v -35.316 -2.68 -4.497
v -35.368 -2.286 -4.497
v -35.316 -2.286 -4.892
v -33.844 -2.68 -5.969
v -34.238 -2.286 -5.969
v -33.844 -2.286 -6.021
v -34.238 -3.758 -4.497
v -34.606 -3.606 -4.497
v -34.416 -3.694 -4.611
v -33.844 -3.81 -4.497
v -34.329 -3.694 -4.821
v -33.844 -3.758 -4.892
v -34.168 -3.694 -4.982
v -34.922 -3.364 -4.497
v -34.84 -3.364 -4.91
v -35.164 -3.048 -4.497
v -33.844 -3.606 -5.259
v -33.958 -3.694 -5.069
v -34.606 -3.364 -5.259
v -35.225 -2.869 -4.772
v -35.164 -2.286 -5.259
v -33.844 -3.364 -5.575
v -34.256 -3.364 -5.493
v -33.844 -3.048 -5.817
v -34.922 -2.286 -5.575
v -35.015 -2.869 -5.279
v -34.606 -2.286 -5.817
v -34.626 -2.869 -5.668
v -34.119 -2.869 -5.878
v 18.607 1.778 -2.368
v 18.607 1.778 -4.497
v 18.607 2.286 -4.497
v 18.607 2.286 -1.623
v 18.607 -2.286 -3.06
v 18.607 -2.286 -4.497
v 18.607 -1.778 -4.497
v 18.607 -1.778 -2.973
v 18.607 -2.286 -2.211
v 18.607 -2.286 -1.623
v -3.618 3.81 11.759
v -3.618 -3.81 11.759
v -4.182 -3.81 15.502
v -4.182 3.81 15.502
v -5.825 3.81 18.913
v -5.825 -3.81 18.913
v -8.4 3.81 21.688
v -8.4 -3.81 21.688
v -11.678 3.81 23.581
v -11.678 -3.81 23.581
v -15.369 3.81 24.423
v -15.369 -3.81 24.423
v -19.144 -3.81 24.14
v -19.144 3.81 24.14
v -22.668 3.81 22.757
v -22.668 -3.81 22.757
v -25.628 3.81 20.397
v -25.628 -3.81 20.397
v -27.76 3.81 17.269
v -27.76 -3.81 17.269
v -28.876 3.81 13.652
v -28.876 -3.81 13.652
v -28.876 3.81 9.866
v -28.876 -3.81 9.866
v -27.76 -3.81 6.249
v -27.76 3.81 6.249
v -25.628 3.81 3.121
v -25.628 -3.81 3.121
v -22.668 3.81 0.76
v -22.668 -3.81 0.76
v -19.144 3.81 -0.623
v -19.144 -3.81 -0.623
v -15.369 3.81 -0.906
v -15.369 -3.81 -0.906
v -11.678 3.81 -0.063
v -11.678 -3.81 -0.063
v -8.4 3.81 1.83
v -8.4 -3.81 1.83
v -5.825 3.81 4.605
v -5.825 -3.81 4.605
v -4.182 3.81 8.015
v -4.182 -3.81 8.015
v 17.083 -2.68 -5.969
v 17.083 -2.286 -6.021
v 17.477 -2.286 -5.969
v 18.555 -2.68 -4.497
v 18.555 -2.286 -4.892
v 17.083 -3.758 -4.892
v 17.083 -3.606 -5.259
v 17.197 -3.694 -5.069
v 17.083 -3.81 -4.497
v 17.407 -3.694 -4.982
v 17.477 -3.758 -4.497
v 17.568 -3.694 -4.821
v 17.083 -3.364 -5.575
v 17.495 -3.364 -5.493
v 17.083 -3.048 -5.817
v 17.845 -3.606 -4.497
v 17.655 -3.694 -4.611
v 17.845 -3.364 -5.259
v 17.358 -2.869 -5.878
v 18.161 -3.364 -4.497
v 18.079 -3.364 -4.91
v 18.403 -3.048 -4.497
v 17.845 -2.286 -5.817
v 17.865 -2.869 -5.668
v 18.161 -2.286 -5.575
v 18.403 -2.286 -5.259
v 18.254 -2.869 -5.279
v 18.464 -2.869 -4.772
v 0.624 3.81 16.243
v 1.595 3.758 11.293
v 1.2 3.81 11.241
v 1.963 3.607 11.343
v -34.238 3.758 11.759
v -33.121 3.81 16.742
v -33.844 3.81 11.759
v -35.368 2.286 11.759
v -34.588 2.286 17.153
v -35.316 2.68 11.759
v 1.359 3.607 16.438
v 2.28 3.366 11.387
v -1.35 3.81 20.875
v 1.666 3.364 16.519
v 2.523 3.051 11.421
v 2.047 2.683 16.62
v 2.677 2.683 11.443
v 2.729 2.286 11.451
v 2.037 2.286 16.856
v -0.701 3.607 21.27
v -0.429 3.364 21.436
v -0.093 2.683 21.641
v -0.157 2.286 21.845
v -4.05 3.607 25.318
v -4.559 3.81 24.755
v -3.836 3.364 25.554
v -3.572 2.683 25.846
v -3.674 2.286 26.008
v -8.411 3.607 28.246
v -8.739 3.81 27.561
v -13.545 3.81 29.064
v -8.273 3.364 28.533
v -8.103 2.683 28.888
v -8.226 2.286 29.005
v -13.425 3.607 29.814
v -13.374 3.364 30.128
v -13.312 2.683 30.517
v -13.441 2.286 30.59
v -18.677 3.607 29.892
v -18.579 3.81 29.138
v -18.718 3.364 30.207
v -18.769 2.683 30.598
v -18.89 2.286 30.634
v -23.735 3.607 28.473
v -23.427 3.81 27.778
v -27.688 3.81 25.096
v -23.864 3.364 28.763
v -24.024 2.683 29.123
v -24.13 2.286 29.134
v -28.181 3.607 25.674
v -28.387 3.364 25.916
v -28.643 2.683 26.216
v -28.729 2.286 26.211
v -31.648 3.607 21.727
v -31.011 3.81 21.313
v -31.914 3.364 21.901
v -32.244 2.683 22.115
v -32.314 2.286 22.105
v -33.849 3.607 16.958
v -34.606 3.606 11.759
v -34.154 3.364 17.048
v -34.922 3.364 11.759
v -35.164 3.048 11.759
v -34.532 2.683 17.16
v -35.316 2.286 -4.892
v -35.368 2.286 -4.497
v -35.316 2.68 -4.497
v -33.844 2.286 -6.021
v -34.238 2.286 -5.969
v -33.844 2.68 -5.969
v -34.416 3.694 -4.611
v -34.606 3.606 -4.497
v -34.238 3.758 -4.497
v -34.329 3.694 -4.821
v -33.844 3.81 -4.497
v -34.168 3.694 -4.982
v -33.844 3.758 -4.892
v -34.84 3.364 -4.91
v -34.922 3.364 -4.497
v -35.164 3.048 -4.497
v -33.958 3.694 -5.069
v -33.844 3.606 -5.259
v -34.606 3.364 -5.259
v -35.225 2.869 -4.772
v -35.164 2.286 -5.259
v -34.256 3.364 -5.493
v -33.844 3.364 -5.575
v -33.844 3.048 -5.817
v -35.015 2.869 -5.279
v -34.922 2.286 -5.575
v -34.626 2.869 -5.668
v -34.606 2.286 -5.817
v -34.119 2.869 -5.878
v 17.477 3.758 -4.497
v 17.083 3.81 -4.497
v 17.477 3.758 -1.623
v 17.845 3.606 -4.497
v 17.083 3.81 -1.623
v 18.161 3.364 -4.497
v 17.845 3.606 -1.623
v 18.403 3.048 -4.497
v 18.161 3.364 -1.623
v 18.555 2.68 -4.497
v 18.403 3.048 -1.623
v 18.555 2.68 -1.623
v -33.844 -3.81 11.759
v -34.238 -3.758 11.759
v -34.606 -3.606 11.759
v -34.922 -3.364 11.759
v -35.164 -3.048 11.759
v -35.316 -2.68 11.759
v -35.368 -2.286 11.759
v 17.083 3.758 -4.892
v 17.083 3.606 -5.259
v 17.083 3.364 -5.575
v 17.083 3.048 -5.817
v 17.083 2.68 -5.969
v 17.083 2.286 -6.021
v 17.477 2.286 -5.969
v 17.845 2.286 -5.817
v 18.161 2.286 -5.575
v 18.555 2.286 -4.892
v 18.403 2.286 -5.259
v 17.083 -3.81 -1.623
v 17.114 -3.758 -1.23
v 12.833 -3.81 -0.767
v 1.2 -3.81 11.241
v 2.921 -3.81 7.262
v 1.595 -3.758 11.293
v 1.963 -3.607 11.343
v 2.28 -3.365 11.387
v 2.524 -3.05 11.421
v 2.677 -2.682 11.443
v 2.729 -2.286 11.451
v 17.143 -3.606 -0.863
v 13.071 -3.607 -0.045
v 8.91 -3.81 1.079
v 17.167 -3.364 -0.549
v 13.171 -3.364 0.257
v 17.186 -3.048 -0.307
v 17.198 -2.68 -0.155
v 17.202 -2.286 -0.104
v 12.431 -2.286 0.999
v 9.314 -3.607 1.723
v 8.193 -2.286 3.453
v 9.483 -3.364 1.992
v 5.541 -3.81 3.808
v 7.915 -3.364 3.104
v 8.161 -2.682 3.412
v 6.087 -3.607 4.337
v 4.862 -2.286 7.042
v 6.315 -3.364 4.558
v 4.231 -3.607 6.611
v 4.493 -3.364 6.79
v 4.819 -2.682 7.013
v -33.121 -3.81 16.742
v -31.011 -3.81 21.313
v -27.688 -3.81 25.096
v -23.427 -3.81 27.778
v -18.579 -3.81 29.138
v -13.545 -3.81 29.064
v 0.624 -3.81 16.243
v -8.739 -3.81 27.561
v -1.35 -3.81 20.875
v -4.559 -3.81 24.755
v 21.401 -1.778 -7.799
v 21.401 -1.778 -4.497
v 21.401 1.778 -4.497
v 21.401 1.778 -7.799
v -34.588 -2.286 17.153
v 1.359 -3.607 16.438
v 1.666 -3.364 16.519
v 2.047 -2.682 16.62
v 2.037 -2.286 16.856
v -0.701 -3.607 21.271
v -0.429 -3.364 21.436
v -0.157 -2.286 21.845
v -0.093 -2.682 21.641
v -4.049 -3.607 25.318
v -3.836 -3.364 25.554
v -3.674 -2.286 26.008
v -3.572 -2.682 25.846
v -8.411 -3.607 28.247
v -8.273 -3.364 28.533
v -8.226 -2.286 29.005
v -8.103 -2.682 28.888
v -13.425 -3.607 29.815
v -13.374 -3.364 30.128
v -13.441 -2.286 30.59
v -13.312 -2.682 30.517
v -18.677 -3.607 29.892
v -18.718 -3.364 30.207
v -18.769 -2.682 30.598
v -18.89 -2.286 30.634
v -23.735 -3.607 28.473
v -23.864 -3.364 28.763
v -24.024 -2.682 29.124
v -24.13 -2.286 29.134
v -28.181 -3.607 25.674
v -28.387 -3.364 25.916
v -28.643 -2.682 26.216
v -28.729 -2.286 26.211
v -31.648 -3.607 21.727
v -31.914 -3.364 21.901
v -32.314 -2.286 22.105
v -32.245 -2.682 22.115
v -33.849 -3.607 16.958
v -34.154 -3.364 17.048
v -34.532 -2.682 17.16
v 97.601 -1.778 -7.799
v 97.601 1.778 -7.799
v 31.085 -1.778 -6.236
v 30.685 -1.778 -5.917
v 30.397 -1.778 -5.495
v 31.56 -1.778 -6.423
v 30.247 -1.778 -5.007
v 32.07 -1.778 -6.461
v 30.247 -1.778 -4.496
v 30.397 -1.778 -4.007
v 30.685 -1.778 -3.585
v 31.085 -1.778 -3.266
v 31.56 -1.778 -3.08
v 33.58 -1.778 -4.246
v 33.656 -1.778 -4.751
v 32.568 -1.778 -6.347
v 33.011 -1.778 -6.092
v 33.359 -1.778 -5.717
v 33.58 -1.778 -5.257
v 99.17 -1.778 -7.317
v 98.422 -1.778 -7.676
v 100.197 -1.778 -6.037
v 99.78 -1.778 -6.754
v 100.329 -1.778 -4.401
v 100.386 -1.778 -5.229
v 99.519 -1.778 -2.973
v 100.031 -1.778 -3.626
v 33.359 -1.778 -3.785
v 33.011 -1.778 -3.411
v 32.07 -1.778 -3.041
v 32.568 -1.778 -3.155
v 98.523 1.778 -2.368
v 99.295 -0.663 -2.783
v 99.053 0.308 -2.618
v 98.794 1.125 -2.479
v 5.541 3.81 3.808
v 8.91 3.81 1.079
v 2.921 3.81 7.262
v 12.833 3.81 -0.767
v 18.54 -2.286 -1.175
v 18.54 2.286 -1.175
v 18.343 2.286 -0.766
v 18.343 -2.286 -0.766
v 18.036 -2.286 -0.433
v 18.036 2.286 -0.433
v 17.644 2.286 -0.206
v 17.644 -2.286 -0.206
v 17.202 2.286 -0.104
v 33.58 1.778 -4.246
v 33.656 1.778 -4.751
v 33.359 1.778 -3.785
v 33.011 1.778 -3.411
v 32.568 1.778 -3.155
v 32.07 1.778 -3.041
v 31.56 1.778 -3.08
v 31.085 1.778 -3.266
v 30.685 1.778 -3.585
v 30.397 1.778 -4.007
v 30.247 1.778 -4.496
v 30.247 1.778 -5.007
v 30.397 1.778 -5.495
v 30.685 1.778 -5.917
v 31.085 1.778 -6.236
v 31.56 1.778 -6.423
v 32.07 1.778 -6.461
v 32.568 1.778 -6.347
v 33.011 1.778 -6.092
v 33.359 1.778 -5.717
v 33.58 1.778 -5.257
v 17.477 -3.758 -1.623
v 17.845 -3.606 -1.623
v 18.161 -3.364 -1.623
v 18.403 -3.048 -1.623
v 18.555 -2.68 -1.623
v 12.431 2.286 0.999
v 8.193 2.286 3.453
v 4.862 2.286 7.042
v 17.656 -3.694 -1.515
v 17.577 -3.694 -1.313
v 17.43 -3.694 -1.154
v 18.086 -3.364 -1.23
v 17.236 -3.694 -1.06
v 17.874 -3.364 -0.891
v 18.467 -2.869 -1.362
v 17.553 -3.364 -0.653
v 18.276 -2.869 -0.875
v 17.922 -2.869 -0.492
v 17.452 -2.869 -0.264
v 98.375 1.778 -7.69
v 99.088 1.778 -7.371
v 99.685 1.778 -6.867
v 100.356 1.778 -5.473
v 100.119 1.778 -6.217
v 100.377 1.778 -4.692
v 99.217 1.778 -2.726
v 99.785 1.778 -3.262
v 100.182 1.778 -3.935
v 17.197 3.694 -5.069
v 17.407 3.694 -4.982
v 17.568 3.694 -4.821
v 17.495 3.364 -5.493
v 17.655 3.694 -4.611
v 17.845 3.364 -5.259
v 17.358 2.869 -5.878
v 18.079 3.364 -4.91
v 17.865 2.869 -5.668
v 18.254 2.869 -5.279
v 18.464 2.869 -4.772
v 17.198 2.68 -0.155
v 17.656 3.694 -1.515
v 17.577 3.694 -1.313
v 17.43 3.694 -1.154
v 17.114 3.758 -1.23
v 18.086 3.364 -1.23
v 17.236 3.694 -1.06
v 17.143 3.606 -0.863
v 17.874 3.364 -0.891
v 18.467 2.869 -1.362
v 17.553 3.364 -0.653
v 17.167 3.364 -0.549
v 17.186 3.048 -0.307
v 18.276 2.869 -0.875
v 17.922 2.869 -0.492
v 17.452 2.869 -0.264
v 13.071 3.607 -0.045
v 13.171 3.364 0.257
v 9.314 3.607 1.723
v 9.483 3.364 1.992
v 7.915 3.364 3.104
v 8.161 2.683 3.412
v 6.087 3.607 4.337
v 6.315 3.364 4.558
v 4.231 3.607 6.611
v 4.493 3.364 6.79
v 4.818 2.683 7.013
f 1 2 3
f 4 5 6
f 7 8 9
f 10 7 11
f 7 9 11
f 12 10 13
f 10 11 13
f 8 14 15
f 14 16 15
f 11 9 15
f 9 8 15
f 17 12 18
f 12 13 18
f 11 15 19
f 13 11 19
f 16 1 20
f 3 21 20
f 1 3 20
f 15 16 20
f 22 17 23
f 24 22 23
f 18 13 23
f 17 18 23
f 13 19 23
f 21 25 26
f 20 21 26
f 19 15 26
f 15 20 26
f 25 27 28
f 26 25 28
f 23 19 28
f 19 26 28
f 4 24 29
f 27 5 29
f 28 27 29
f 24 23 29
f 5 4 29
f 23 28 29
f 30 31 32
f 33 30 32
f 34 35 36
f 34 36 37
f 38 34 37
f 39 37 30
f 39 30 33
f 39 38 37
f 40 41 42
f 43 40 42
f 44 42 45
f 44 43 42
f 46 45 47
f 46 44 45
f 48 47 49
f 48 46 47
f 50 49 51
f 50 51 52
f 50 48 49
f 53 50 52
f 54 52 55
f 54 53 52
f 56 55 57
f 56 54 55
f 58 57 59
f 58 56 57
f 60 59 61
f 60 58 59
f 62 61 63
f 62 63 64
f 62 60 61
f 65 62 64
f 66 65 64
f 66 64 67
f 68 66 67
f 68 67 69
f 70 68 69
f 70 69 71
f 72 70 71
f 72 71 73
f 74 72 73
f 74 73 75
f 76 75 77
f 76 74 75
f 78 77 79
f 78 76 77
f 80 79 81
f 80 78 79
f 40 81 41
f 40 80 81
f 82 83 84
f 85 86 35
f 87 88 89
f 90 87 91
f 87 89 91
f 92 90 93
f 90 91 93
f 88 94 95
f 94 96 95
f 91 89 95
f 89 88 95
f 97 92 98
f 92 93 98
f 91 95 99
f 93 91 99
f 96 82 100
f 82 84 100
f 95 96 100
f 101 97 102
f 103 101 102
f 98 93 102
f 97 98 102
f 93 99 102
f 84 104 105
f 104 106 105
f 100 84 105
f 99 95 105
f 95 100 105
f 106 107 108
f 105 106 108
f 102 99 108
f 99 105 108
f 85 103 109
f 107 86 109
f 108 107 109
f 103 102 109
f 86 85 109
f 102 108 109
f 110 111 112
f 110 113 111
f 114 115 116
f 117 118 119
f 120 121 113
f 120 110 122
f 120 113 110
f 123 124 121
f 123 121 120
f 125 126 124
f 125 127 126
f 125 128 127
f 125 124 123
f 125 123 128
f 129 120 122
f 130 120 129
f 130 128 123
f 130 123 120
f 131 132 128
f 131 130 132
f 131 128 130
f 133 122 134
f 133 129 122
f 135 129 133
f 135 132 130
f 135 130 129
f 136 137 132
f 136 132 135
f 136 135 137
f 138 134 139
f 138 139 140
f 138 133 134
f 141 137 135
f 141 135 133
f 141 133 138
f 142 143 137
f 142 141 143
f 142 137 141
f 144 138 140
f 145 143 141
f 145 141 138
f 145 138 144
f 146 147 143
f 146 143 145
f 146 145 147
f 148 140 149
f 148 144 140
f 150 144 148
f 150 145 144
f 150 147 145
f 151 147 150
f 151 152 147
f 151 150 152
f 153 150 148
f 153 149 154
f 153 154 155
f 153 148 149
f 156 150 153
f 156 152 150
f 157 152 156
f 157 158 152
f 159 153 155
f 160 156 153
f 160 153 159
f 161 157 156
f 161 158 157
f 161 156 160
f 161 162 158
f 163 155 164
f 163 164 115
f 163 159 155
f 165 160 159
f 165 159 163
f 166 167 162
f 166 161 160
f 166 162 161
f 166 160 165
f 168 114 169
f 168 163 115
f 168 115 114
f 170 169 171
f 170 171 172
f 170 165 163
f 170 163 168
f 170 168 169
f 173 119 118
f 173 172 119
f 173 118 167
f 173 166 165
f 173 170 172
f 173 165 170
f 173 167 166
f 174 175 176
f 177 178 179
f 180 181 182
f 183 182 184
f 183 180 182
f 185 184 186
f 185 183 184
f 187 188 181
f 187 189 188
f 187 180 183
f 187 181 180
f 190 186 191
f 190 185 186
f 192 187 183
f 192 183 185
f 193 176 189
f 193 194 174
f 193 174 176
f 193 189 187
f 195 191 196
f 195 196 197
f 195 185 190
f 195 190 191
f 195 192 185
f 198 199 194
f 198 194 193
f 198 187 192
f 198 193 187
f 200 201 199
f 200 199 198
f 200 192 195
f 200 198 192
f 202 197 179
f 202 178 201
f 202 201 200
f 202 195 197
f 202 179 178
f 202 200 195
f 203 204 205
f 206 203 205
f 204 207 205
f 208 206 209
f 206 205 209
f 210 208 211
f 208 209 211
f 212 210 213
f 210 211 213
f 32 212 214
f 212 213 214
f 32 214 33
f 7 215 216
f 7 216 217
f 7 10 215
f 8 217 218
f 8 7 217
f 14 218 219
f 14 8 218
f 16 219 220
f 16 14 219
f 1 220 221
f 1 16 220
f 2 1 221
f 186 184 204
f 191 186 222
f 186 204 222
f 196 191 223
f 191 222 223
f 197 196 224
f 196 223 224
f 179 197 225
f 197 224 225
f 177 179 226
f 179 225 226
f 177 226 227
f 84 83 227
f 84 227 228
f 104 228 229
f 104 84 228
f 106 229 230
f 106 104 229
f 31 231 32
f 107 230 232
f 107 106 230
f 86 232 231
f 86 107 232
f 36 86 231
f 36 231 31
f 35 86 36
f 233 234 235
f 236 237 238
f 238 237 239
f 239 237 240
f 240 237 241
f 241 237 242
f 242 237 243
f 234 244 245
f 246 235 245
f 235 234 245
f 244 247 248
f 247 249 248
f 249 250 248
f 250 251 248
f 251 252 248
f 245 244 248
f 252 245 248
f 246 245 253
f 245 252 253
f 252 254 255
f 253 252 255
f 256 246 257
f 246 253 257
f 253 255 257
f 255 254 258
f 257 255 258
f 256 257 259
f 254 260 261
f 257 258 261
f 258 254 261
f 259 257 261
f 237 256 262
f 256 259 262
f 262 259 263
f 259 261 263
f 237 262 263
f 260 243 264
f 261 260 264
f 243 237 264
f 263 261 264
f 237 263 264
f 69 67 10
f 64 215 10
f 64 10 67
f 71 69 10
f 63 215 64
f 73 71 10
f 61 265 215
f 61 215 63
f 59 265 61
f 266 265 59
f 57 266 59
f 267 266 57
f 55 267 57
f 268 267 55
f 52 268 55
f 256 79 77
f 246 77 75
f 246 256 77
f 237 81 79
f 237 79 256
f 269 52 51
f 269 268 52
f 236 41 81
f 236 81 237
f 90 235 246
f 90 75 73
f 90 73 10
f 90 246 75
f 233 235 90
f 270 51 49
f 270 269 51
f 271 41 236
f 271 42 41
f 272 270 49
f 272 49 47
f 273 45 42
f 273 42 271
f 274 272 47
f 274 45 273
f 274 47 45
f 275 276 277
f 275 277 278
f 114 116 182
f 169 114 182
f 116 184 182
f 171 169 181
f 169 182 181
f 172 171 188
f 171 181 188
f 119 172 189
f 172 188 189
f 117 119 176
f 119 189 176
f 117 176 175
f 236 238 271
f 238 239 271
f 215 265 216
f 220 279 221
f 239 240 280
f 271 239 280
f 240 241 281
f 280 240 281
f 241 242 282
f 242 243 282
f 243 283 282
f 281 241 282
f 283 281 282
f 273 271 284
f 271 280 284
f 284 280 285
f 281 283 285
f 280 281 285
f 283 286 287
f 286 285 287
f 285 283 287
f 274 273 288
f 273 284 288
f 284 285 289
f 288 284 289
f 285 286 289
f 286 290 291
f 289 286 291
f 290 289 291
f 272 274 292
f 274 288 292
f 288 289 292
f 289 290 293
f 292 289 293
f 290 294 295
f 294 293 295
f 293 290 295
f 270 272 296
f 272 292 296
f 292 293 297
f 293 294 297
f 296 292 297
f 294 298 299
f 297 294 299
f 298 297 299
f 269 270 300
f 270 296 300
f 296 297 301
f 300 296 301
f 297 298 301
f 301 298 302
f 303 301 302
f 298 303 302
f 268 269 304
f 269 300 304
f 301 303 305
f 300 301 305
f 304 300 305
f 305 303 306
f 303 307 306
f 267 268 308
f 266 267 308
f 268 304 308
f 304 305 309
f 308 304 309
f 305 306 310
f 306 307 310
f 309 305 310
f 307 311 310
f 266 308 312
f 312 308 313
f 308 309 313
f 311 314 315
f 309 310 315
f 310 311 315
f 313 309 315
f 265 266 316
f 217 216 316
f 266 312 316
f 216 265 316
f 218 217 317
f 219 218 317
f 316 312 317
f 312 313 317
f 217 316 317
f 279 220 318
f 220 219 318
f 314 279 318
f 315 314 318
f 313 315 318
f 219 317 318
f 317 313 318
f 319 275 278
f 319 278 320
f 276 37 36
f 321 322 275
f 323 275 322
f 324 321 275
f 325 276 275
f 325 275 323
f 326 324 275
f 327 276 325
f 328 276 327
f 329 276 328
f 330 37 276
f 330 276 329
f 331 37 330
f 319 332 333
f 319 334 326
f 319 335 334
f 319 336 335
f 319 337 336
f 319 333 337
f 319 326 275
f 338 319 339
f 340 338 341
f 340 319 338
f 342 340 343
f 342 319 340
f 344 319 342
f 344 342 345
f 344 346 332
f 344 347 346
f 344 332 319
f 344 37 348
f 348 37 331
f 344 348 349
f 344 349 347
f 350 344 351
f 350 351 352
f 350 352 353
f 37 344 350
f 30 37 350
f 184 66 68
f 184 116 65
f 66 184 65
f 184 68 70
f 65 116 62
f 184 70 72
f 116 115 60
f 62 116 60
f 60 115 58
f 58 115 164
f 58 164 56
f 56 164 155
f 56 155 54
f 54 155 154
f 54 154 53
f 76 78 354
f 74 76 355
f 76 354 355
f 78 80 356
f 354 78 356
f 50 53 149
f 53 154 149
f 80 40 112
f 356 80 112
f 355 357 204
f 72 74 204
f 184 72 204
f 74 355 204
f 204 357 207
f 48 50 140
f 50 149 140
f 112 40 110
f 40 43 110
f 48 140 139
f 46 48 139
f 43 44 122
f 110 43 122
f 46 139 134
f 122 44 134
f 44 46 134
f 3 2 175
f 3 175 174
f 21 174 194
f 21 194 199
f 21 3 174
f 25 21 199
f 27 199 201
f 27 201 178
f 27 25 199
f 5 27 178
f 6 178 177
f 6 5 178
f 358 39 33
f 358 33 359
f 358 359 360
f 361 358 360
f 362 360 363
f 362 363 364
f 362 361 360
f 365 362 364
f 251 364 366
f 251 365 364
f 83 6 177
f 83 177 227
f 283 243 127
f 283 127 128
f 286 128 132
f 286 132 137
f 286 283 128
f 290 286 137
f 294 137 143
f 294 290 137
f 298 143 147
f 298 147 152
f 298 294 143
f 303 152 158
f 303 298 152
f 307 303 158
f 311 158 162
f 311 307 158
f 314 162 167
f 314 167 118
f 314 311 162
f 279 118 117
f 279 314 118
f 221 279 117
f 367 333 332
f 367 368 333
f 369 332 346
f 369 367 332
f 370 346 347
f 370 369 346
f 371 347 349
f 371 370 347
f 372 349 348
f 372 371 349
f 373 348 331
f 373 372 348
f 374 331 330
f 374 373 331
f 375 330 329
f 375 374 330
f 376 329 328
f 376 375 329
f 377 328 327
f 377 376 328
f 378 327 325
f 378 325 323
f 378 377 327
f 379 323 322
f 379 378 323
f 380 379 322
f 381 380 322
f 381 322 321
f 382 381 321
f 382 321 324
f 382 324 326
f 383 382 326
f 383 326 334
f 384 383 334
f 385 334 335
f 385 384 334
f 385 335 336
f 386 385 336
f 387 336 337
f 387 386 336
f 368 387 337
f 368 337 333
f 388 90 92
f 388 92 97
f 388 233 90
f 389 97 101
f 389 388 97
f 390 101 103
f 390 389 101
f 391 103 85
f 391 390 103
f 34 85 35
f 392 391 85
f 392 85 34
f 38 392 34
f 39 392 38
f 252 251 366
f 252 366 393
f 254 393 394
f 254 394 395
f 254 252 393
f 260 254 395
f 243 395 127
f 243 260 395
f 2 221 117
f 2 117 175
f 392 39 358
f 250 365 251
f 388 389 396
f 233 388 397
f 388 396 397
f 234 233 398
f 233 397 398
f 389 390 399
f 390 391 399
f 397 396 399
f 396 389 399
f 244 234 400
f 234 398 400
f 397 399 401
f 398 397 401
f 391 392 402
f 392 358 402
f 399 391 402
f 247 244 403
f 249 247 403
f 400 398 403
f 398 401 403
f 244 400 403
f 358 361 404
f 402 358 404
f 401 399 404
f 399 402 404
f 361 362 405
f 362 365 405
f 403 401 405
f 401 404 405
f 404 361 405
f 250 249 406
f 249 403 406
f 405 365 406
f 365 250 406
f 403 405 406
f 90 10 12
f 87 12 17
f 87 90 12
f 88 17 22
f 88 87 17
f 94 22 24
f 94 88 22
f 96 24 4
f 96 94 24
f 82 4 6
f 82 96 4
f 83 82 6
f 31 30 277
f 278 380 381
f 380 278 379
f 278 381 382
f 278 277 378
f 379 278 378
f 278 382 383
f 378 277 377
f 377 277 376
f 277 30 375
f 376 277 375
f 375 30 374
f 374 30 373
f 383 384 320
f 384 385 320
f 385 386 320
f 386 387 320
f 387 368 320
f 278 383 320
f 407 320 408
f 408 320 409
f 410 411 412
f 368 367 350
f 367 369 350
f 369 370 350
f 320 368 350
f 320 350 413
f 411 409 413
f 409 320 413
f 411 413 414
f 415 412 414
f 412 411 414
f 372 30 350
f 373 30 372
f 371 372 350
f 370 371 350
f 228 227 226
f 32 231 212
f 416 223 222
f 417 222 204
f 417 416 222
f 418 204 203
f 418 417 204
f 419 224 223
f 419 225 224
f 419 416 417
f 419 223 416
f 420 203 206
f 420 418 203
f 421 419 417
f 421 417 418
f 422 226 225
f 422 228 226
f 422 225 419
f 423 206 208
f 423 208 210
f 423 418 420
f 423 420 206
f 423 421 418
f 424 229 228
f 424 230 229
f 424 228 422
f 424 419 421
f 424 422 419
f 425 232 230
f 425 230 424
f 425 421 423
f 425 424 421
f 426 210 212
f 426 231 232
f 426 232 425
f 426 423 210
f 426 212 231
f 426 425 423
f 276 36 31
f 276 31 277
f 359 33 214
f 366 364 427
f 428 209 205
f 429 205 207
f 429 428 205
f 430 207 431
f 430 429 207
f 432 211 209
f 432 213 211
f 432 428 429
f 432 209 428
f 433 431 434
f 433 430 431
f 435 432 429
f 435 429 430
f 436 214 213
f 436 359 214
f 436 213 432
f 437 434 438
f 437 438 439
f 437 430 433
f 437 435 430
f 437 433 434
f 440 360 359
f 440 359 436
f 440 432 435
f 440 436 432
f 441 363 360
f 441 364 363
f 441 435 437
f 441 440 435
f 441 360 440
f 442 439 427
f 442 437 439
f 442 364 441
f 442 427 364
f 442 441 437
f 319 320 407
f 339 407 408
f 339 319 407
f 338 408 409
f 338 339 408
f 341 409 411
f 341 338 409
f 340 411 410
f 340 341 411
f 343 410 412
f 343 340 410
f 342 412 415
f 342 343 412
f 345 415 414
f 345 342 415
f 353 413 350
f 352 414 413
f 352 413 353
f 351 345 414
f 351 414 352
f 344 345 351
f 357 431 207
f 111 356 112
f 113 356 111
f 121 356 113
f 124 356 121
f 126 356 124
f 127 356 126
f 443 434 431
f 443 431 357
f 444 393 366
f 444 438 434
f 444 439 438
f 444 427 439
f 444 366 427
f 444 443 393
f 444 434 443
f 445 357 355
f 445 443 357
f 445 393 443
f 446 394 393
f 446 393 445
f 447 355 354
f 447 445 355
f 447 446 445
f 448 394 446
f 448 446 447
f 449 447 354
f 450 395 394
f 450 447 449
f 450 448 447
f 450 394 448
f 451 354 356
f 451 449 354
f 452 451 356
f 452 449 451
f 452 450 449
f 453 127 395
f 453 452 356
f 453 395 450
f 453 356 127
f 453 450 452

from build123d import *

# Parameters (mm, degrees)
F0_R     = 1.7145
F1_DEPTH = 1.778
F0_R_2   = 12.7
F2_DEPTH = 3.81
F3_R     = 1.524
F5_DEPTH = 81.789
F6_DEPTH = 81.789


with BuildPart() as f1:
    # F0 (on Front) → F1 (new body, symmetric)
    with BuildSketch(Plane.XZ):
        with BuildLine():
            Line((18.6069666262, -2.2111574336), (18.6069666262, -4.4971574336))
            Line((18.6069666262, -4.4971574336), (21.4009666262, -4.4971574336))
            Line((21.4009666262, -4.4971574336), (21.4009666262, -7.7991574336))
            Line((21.4009666262, -7.7991574336), (97.6009666262, -7.7991574336))
            ThreePointArc((97.6009666262, -7.7991574336), (100.3949666262, -5.0051574336), (97.6009666262, -2.2111574336))
            Line((97.6009666262, -2.2111574336), (18.6069666262, -2.2111574336))
        make_face()
        with Locations((31.9419666262, -4.7511574336)):
            Circle(F0_R, mode=Mode.SUBTRACT)
    extrude(amount=F1_DEPTH, both=True)

    # F0 (on Front) → F2 (join, symmetric)
    with BuildSketch(Plane.XZ):
        with BuildLine():
            ThreePointArc((-35.3680333738, -4.4971574336), (-34.9216641084, -5.5747881681), (-33.8440333738, -6.0211574336))
            Line((-33.8440333738, -6.0211574336), (17.0829666262, -6.0211574336))
            ThreePointArc((17.0829666262, -6.0211574336), (18.1605973607, -5.5747881681), (18.6069666262, -4.4971574336))
            Line((18.6069666262, -4.4971574336), (18.6069666262, -2.2111574336))
            Line((18.6069666262, -2.2111574336), (18.6069666262, -1.6228641659))
            ThreePointArc((18.6069666262, -1.6228641659), (18.2019597184, -0.5882480731), (17.2022022436, -0.1035357395))
            ThreePointArc((17.2022022436, -0.1035357395), (8.1933226976, 3.4532292373), (2.7294715366, 11.4505299235))
            ThreePointArc((2.7294715366, 11.4505299235), (-16.1638720044, 30.8082187838), (-35.3680333738, 11.7588425664))
            Line((-35.3680333738, 11.7588425664), (-35.3680333738, -4.4971574336))
        make_face()
        with Locations((-16.3180333738, 11.7588425664)):
            Circle(F0_R_2, mode=Mode.SUBTRACT)
    extrude(amount=F2_DEPTH, both=True)

    # F3
    f3_edges = [f1.edges().sort_by_distance(p)[0] for p in [
        (-16.163872, -3.81, 30.808219),
        (-16.163872, 3.81, 30.808219),
    ]]
    fillet(f3_edges, radius=F3_R)

    # F4 (on face) → F5 (cut, through all)
    with BuildSketch(Plane.YZ.offset(18.6069666262)):
        Polygon((-2.286, -2.2111574336), (-2.286, -3.0600107998), (2.6955511421, -2.2111574336), align=None)
    extrude(amount=F5_DEPTH, mode=Mode.SUBTRACT)

    # F4 (on face) → F6 (cut, through all)
    with BuildSketch(Plane.YZ.offset(18.6069666262)):
        Polygon((-2.286, -2.2111574336), (-2.286, -3.0600107998), (2.6955511421, -2.2111574336), align=None)
    extrude(amount=F6_DEPTH, mode=Mode.SUBTRACT)


solid = f1.part
